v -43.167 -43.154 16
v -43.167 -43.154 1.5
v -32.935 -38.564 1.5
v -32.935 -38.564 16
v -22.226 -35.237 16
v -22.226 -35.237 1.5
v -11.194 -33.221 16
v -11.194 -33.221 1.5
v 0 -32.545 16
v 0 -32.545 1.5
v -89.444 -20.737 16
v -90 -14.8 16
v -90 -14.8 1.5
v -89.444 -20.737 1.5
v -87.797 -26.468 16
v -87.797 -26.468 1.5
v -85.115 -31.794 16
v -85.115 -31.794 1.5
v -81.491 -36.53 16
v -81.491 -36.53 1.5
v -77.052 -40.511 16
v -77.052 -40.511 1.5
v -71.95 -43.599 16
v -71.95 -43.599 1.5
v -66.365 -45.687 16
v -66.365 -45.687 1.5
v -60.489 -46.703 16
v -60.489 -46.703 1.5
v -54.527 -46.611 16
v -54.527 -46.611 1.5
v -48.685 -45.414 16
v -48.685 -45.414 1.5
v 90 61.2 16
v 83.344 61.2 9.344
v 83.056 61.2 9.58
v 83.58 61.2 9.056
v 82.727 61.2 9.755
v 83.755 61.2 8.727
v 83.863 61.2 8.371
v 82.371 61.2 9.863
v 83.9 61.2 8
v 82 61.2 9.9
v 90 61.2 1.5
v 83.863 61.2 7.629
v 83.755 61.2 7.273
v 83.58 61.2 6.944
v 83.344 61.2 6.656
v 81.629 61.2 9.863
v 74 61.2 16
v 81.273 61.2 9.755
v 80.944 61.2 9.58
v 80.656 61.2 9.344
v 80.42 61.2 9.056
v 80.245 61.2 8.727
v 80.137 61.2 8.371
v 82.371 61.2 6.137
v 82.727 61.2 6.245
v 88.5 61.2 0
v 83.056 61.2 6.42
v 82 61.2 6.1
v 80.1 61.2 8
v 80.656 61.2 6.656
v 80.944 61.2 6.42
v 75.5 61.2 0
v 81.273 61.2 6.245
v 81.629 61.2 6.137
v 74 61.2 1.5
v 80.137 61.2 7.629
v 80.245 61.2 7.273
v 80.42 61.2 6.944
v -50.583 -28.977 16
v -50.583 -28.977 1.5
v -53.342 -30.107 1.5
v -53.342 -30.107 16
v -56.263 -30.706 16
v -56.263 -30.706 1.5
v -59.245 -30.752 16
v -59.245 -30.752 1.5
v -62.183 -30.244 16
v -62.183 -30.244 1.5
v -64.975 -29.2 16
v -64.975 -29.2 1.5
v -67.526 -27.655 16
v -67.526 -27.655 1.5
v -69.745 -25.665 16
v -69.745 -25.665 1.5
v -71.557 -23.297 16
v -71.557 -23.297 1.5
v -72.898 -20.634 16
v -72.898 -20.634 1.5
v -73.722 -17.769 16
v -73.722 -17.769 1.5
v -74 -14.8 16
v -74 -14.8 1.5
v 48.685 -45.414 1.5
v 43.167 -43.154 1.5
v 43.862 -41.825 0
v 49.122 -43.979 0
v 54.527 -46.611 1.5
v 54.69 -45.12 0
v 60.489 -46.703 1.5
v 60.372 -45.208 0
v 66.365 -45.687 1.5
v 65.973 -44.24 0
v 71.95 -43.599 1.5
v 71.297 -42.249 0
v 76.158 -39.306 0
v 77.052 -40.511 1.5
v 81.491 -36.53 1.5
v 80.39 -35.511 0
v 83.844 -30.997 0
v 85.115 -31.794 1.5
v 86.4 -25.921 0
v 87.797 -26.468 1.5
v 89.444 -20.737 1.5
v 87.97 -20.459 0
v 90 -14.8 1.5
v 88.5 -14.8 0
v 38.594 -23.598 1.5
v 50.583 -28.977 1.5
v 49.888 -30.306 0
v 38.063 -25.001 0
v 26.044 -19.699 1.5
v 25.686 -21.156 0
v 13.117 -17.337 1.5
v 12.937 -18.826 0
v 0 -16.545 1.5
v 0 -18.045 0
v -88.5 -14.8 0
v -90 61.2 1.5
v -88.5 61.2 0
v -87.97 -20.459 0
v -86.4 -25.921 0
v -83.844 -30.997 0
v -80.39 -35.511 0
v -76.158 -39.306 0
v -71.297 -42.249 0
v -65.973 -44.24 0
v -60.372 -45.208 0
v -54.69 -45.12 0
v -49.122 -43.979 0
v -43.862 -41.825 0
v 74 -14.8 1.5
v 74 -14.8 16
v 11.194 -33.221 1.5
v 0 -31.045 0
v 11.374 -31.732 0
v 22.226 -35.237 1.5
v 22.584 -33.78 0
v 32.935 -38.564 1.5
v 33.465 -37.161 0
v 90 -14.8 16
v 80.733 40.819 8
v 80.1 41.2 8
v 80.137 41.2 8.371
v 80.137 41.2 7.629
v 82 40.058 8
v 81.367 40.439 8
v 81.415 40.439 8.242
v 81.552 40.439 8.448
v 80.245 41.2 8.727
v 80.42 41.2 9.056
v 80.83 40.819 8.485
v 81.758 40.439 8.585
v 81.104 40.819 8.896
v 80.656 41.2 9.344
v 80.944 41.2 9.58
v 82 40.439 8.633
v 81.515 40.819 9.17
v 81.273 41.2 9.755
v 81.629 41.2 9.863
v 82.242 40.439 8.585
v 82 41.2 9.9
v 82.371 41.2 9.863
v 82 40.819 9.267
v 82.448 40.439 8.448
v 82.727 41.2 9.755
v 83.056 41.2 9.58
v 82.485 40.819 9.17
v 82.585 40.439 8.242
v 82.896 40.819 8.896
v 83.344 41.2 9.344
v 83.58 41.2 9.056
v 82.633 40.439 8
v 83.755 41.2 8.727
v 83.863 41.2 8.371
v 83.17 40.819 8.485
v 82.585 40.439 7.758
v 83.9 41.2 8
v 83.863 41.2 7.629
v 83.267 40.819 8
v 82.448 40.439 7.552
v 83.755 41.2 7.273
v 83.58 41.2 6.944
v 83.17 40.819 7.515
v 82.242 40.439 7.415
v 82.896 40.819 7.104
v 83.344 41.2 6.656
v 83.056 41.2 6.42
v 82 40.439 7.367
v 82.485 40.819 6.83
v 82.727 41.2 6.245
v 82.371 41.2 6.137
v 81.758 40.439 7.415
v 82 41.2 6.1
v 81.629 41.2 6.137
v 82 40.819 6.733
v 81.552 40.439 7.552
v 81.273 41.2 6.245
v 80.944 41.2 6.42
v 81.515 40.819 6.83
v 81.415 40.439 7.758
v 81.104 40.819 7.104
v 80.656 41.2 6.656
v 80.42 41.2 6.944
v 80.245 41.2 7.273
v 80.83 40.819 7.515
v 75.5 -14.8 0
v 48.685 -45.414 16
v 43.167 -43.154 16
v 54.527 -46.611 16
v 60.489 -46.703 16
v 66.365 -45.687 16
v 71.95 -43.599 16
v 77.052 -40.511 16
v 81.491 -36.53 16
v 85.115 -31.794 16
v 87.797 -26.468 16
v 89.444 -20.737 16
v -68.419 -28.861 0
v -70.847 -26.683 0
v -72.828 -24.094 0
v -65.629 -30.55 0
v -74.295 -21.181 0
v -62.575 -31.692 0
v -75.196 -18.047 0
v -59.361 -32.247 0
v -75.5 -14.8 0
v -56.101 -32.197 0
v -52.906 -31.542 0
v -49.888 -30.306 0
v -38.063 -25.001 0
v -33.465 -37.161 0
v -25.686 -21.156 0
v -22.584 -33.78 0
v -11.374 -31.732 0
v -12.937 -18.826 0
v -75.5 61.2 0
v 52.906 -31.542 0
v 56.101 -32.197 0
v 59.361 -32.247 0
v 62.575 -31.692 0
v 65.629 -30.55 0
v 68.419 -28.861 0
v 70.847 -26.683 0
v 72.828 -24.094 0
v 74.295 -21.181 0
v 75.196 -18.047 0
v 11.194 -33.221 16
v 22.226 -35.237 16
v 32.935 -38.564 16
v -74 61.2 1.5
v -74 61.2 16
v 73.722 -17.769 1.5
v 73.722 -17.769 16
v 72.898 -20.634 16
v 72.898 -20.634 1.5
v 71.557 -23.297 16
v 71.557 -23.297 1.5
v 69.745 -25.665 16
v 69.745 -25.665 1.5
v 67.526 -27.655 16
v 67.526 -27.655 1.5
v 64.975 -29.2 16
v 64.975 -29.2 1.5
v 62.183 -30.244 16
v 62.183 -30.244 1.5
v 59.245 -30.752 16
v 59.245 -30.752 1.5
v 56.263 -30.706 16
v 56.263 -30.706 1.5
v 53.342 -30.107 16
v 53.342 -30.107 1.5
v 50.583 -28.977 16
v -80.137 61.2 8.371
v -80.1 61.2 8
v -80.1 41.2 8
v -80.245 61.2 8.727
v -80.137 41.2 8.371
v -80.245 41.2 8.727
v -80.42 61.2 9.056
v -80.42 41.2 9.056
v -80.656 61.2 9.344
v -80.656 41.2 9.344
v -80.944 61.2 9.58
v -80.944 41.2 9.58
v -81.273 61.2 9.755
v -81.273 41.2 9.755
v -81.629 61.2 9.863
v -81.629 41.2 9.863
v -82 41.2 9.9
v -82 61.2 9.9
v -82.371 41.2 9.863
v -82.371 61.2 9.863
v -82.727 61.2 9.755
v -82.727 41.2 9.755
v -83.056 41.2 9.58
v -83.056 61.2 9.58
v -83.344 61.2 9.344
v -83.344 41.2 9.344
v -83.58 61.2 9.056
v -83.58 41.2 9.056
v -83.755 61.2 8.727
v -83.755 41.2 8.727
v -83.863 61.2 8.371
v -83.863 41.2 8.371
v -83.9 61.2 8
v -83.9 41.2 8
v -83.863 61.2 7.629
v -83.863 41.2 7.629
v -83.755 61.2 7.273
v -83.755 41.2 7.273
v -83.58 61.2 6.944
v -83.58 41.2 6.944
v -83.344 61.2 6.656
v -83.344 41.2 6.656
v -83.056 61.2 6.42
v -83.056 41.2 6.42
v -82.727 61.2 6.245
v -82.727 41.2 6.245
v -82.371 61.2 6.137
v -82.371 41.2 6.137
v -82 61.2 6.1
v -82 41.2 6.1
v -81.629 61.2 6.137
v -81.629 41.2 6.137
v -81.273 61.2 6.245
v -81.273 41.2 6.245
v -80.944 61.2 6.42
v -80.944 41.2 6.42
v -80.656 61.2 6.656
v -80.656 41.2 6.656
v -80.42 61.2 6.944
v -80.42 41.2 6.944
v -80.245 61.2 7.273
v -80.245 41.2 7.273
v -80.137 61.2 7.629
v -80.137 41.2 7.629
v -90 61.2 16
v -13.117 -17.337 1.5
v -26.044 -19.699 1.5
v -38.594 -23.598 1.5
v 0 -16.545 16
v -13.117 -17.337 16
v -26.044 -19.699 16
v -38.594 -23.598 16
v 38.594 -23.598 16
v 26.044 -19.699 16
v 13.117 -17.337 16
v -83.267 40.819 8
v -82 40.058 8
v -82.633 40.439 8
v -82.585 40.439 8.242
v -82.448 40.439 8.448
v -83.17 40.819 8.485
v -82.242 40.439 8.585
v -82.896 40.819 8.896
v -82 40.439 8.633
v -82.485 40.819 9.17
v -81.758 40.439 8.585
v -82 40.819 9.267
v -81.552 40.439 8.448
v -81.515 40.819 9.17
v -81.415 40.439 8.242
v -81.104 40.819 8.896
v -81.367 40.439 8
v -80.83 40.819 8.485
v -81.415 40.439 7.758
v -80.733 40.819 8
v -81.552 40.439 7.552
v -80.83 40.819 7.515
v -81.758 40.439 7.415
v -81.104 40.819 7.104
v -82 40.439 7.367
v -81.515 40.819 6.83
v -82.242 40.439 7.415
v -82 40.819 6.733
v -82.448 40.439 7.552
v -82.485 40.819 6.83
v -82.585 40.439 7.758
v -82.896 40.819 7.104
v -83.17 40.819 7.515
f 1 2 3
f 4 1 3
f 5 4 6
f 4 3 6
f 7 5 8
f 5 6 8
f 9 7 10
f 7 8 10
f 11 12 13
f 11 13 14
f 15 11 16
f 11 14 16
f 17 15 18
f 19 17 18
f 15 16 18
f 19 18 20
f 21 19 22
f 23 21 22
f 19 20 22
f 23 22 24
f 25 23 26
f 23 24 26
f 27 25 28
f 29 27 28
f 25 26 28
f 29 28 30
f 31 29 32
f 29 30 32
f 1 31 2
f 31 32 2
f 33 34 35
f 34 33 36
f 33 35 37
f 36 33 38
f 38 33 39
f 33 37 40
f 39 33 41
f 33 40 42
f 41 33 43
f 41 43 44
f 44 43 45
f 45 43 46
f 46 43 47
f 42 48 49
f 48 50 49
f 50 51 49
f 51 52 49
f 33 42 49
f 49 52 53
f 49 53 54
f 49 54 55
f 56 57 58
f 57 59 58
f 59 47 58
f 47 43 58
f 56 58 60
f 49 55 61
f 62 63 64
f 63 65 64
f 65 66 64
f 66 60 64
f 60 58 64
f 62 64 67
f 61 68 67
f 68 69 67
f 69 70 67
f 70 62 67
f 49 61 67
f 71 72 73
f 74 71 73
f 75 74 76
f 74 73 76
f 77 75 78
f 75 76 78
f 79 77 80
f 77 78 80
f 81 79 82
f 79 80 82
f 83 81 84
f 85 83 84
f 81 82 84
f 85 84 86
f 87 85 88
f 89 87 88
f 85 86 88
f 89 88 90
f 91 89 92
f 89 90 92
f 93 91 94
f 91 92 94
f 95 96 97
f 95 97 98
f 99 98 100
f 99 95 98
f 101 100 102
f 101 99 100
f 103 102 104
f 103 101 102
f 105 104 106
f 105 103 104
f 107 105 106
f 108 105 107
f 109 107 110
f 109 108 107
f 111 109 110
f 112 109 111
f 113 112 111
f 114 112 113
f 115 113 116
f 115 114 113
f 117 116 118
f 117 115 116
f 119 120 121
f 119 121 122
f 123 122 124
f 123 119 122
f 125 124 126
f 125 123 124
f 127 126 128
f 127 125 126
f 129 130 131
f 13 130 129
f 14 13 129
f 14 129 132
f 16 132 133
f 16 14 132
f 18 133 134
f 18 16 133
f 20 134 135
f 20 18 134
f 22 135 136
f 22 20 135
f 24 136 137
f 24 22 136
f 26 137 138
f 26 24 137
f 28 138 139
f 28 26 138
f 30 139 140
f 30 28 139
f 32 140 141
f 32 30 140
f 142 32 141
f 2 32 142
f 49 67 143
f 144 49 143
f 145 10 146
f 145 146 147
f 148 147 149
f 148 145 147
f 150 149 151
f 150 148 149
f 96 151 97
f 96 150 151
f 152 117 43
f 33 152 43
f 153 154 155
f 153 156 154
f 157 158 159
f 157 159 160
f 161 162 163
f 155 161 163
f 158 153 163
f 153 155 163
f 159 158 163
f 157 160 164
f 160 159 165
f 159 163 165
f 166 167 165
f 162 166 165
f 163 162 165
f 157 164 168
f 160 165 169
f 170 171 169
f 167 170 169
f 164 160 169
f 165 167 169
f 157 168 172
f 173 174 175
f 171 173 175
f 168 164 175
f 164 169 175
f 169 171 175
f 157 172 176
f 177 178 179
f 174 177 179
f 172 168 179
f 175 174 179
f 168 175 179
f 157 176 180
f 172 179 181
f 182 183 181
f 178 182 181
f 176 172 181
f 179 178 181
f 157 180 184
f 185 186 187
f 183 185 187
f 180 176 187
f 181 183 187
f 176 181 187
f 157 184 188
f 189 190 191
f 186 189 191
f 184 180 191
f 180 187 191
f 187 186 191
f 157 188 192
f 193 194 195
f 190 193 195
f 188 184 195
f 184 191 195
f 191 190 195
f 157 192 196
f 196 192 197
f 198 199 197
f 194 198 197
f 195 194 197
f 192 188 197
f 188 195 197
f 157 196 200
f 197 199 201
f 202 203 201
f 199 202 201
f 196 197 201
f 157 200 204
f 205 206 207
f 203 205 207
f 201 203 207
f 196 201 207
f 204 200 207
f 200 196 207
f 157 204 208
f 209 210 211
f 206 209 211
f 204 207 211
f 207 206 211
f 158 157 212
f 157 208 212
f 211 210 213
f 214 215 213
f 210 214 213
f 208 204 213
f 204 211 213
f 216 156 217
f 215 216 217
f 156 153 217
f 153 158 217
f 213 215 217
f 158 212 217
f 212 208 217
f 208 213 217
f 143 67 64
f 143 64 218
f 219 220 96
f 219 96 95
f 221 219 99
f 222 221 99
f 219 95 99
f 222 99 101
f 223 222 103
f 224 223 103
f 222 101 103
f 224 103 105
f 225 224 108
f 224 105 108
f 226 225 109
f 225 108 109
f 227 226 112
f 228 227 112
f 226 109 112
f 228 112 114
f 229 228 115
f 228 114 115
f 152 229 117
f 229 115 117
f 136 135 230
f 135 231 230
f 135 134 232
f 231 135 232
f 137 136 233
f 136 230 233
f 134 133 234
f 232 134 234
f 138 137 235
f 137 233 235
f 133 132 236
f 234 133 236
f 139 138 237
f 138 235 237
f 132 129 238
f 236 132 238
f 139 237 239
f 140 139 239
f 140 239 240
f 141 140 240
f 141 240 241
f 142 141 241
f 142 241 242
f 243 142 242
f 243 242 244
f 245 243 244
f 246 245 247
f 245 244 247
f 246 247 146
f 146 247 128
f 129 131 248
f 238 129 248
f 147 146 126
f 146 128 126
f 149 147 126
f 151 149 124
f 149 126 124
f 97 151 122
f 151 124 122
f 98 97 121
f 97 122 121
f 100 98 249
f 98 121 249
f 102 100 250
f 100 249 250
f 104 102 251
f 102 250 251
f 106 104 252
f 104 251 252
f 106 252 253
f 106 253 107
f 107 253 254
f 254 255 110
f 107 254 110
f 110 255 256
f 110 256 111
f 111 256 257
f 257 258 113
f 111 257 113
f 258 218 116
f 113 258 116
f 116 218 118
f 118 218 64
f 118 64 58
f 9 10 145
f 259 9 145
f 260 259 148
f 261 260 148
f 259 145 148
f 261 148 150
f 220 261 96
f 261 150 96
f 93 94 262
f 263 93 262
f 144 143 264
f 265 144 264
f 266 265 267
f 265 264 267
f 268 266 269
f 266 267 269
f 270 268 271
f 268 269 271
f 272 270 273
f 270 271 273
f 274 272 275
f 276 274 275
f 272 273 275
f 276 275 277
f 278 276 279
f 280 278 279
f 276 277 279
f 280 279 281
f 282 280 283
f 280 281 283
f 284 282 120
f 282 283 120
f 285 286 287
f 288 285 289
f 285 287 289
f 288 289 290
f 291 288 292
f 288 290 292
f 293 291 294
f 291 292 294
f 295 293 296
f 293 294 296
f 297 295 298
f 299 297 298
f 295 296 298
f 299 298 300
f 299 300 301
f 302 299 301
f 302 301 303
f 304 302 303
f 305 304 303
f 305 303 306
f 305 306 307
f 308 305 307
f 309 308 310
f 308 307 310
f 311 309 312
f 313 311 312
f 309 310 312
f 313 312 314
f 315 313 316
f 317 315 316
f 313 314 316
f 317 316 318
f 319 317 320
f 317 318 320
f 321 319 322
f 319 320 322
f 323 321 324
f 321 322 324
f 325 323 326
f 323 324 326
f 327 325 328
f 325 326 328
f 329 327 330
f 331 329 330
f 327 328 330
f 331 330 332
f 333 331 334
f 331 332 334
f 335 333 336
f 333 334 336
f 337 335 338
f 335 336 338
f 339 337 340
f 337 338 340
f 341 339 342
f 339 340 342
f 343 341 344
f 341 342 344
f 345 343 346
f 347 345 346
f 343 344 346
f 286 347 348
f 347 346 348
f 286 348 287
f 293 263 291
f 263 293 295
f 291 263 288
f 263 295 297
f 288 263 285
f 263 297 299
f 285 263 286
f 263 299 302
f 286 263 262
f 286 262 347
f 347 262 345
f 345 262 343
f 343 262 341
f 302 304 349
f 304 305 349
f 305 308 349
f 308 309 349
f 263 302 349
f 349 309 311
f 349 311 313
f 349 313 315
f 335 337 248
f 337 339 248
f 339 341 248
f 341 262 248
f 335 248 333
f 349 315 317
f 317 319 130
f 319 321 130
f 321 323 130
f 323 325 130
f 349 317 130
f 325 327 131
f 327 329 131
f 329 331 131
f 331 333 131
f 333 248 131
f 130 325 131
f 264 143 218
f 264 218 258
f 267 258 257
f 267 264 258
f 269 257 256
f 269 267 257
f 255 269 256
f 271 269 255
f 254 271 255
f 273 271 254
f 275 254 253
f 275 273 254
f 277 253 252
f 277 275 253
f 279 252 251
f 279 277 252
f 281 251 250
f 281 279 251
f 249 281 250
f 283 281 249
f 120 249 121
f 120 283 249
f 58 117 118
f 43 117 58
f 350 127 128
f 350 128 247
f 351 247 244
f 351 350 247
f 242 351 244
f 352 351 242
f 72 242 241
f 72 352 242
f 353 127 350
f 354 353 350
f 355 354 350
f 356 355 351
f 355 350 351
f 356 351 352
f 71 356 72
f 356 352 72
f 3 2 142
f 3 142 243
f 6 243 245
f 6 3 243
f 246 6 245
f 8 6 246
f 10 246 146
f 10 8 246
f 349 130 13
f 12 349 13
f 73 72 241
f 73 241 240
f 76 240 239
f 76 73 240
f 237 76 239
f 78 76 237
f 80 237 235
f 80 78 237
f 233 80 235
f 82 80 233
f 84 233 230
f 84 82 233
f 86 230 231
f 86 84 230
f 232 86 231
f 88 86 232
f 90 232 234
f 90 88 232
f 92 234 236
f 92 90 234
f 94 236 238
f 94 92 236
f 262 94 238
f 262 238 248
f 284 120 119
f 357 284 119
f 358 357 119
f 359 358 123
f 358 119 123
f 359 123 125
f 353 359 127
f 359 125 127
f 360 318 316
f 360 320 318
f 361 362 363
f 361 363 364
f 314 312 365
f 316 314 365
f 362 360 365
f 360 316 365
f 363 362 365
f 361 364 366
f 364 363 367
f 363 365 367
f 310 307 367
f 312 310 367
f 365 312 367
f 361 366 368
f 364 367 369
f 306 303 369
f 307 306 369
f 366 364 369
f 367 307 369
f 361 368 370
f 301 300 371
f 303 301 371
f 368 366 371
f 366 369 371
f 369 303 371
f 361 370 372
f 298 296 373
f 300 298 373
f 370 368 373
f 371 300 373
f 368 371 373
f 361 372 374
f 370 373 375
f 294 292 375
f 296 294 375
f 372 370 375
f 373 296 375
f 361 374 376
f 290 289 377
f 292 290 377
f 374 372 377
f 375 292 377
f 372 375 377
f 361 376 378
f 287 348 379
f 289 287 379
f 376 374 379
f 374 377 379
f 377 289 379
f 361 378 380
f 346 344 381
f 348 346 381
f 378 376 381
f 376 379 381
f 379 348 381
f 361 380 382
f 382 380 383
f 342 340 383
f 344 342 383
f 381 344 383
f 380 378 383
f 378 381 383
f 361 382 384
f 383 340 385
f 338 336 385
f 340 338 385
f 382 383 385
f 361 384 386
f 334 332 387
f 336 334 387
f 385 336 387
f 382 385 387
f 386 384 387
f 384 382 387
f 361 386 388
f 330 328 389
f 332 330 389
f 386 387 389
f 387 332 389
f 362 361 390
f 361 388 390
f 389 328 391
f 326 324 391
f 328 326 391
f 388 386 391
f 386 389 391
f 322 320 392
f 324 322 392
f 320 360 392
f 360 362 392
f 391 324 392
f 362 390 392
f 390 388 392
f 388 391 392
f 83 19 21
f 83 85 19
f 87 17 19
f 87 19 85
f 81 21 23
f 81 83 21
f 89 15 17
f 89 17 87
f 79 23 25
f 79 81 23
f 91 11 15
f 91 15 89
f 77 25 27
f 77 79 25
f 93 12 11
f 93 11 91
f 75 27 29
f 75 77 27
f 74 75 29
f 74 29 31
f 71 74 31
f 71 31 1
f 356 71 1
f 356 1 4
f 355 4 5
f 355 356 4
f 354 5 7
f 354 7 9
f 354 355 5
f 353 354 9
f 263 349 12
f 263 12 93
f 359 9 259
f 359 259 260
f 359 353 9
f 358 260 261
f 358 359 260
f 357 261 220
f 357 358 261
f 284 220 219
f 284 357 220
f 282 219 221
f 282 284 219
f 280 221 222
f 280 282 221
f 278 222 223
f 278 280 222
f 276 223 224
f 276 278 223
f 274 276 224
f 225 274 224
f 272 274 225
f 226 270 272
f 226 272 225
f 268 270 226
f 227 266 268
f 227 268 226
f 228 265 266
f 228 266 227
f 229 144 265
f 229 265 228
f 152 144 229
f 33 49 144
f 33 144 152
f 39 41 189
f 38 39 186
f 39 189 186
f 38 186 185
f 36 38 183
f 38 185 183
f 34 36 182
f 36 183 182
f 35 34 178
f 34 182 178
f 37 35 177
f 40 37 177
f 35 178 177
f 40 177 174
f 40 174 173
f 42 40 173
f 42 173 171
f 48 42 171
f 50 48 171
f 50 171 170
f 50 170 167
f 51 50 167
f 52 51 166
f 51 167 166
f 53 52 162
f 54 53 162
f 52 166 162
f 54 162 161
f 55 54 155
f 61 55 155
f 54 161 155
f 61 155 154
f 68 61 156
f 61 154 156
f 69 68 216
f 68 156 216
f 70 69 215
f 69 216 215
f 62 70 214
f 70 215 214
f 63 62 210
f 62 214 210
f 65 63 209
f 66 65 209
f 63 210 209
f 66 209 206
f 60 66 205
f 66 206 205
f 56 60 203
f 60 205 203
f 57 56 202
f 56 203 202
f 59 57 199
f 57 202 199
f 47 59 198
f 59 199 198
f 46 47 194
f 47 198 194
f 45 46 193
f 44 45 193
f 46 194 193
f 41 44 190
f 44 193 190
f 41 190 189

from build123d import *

# Parameters (mm, degrees)
F1_DEPTH = 16
F3_D     = 3.8
F3_DEPTH = 20
F3_TIP   = 1.1416351762
F4_SIZE  = 1.5


with BuildPart() as f1:
    # F0 (on Top) → F1 (new body)
    with BuildSketch(Plane.XY):
        with BuildLine():
            Line((-74, -14.8000685584), (-74, 61.1999314416))
            Line((-74, 61.1999314416), (-90, 61.1999314416))
            Line((-90, 61.1999314416), (-90, -14.8000685584))
            ThreePointArc((-90, -14.8000685584), (-74.5730833817, -42.1740143321), (-43.1666932985, -43.1544864205))
            ThreePointArc((-43.1666932985, -43.1544864205), (-22.2256381935, -35.236562411), (0, -32.5454071904))
            ThreePointArc((0, -32.5454071904), (22.2256381935, -35.236562411), (43.1666932985, -43.1544864205))
            ThreePointArc((43.1666932985, -43.1544864205), (74.5730833817, -42.1740143321), (90, -14.8000685584))
            Line((90, -14.8000685584), (90, 61.1999314416))
            Line((90, 61.1999314416), (74, 61.1999314416))
            Line((74, 61.1999314416), (74, -14.8000685584))
            ThreePointArc((74, -14.8000685584), (66.2865416908, -28.4870414452), (50.5833466493, -28.9772774894))
            ThreePointArc((50.5833466493, -28.9772774894), (26.0443197136, -19.6989412466), (0, -16.5454071904))
            ThreePointArc((0, -16.5454071904), (-26.0443197136, -19.6989412466), (-50.5833466493, -28.9772774894))
            ThreePointArc((-50.5833466493, -28.9772774894), (-66.2865416908, -28.4870414452), (-74, -14.8000685584))
        make_face()
    extrude(amount=F1_DEPTH)

    # F3
    with Locations(Plane(origin=(0, 61.1999314416, 0), x_dir=(-1, 0, 0), z_dir=(0, 1, 0))):
        with Locations((82, 8), (-82, 8)):
            Hole(F3_D / 2, depth=F3_DEPTH)
            with Locations((0, 0, -(F3_DEPTH + F3_TIP / 2))):  # 118° drill point
                Cone(0, F3_D / 2, F3_TIP, mode=Mode.SUBTRACT)

    # F4
    f4_edges = [f1.edges().sort_by_distance(p)[0] for p in [
        (74.573083, -42.174014, 0),
        (66.286542, -28.487041, 0),
    ]]
    chamfer(f4_edges, length=F4_SIZE)


solid = f1.part
